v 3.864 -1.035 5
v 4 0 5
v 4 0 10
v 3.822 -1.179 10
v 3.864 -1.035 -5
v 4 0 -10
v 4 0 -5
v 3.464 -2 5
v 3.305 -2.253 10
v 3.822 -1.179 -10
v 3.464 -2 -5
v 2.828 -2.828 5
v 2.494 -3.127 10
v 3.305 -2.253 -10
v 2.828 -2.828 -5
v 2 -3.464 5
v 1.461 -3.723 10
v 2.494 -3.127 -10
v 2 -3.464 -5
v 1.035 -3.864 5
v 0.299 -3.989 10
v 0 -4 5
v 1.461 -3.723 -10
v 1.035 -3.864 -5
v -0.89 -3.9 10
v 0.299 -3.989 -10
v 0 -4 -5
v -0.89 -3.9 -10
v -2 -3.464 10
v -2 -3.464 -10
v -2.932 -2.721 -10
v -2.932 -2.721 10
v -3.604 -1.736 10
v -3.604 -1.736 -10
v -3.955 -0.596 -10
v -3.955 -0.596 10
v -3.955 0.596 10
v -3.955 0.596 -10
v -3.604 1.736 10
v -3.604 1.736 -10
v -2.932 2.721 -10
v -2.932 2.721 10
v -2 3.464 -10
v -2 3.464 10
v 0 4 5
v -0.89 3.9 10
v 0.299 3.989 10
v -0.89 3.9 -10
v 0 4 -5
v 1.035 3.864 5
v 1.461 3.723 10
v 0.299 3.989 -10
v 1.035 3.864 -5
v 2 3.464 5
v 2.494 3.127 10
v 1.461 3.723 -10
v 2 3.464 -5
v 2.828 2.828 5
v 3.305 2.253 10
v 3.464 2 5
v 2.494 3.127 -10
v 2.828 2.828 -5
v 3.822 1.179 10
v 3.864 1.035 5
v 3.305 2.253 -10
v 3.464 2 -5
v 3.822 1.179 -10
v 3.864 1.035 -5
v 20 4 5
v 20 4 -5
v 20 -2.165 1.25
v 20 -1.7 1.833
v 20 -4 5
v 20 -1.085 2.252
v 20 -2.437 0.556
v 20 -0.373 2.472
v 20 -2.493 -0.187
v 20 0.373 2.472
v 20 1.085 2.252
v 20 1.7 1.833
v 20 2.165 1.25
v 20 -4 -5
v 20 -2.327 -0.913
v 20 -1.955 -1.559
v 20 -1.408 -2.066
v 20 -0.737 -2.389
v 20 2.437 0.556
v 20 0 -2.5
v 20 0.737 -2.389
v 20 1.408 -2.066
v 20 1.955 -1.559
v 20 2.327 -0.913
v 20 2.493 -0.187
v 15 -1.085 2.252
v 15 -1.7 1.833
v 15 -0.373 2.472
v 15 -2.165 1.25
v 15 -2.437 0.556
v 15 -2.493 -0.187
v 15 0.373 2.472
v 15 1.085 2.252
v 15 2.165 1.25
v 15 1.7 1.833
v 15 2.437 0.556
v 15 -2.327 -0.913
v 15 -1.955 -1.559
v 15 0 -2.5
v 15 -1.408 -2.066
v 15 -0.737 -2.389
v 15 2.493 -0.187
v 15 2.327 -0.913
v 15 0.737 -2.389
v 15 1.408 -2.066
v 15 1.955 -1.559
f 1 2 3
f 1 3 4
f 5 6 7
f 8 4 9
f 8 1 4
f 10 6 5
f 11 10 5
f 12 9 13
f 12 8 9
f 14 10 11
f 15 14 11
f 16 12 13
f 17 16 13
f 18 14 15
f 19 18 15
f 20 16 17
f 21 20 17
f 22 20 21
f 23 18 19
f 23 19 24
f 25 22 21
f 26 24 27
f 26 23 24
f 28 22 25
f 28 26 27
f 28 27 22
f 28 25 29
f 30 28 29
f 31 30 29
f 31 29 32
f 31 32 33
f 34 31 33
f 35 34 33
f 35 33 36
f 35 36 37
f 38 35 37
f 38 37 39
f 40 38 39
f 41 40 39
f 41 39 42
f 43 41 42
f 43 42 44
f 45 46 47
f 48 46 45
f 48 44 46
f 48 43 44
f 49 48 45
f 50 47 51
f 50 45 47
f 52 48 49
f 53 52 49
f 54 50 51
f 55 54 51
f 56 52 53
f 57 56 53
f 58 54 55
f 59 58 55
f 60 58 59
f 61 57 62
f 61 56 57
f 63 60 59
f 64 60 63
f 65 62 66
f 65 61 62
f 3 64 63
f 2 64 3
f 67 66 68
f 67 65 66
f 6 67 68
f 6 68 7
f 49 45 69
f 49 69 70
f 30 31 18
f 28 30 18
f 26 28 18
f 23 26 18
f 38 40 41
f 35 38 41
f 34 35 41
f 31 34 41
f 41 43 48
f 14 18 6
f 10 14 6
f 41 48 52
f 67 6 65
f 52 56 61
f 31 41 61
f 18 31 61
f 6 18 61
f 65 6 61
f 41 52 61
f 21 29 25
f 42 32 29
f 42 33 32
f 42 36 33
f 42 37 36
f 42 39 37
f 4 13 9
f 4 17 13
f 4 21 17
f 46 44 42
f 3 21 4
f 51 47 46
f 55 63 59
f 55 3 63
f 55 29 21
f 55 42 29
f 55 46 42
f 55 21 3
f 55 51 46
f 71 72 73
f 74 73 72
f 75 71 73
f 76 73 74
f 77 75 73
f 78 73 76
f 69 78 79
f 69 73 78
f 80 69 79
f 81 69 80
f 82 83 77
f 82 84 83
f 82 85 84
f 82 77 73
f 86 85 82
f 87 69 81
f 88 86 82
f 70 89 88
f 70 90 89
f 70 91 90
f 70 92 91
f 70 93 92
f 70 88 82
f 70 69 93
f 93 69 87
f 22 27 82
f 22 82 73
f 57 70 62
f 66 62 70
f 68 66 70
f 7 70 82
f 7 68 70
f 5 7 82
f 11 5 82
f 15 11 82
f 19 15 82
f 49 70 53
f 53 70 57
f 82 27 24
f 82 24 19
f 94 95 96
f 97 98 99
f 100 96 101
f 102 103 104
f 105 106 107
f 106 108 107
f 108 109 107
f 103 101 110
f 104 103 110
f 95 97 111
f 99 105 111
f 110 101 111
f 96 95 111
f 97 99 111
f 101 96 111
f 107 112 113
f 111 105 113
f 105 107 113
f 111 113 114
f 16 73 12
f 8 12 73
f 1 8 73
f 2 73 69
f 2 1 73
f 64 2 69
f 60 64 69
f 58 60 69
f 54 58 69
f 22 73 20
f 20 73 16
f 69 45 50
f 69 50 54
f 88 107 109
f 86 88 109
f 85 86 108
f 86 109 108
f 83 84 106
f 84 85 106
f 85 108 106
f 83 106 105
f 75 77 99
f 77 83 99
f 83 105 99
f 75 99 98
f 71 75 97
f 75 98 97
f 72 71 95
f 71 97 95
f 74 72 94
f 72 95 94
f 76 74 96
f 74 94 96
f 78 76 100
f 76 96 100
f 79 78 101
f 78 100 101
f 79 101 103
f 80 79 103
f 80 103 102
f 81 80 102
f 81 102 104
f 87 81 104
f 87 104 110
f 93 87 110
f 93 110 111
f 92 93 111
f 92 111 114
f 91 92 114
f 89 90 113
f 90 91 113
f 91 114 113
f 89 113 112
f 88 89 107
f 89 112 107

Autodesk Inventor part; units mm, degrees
ref_plane "YZ Plane" through (0, 0, 0) normal (1, 0, 0) x (0, 1, 0)
ref_plane "XZ Plane" through (0, 0, 0) normal (0, 1, 0) x (-1, 0, 0)
ref_plane "XY Plane" through (0, 0, 0) normal (0, 0, 1) x (1, 0, 0)
sketch "Sketch1" plane through (0, 0, 0) normal (0, 0, 1) x (1, 0, 0)
  circle A0 centre (0, 0) radius 4
  line L0 (15, 1) -> (15, 4)
  line L1 (4, 0) -> (7.8423, 0)
  line L2 (15, 4) -> (0, 4)
  line L3 (15, -1) -> (15, -4)
  line L4 (15, -4) -> (0, -4)
  line L5 (15, 1) -> (15, -1)
  point P0 (0, -4)
  dimension "d0" = 8
  dimension "d2" = 15
extrude "Extrusion1" add sketch "Sketch1" along normal mid plane 10 contours A0 L2 L0 L5 L3 L4
extrude "Extrusion2" add sketch "Sketch1" along normal mid plane 20 contours A0
sketch "Sketch2" plane through (15, -4, 5) normal (1, 0, 0) x (0, 0, -1)
  circle A0 centre (5, 4) radius 2.5
  line L0 (0, 0) -> (0, 8) projected
  line L1 (10, 8) -> (10, 0) projected
  line L2 (0, 8) -> (10, 8)
  line L3 (10, 8) -> (10, 0)
  line L4 (10, 0) -> (0, 0)
  line L5 (0, 0) -> (0, 8)
  dimension "d7" = 5
extrude "Extrusion3" add sketch "Sketch2" along normal blind 5
properties part number "Pitch and Yaw"
